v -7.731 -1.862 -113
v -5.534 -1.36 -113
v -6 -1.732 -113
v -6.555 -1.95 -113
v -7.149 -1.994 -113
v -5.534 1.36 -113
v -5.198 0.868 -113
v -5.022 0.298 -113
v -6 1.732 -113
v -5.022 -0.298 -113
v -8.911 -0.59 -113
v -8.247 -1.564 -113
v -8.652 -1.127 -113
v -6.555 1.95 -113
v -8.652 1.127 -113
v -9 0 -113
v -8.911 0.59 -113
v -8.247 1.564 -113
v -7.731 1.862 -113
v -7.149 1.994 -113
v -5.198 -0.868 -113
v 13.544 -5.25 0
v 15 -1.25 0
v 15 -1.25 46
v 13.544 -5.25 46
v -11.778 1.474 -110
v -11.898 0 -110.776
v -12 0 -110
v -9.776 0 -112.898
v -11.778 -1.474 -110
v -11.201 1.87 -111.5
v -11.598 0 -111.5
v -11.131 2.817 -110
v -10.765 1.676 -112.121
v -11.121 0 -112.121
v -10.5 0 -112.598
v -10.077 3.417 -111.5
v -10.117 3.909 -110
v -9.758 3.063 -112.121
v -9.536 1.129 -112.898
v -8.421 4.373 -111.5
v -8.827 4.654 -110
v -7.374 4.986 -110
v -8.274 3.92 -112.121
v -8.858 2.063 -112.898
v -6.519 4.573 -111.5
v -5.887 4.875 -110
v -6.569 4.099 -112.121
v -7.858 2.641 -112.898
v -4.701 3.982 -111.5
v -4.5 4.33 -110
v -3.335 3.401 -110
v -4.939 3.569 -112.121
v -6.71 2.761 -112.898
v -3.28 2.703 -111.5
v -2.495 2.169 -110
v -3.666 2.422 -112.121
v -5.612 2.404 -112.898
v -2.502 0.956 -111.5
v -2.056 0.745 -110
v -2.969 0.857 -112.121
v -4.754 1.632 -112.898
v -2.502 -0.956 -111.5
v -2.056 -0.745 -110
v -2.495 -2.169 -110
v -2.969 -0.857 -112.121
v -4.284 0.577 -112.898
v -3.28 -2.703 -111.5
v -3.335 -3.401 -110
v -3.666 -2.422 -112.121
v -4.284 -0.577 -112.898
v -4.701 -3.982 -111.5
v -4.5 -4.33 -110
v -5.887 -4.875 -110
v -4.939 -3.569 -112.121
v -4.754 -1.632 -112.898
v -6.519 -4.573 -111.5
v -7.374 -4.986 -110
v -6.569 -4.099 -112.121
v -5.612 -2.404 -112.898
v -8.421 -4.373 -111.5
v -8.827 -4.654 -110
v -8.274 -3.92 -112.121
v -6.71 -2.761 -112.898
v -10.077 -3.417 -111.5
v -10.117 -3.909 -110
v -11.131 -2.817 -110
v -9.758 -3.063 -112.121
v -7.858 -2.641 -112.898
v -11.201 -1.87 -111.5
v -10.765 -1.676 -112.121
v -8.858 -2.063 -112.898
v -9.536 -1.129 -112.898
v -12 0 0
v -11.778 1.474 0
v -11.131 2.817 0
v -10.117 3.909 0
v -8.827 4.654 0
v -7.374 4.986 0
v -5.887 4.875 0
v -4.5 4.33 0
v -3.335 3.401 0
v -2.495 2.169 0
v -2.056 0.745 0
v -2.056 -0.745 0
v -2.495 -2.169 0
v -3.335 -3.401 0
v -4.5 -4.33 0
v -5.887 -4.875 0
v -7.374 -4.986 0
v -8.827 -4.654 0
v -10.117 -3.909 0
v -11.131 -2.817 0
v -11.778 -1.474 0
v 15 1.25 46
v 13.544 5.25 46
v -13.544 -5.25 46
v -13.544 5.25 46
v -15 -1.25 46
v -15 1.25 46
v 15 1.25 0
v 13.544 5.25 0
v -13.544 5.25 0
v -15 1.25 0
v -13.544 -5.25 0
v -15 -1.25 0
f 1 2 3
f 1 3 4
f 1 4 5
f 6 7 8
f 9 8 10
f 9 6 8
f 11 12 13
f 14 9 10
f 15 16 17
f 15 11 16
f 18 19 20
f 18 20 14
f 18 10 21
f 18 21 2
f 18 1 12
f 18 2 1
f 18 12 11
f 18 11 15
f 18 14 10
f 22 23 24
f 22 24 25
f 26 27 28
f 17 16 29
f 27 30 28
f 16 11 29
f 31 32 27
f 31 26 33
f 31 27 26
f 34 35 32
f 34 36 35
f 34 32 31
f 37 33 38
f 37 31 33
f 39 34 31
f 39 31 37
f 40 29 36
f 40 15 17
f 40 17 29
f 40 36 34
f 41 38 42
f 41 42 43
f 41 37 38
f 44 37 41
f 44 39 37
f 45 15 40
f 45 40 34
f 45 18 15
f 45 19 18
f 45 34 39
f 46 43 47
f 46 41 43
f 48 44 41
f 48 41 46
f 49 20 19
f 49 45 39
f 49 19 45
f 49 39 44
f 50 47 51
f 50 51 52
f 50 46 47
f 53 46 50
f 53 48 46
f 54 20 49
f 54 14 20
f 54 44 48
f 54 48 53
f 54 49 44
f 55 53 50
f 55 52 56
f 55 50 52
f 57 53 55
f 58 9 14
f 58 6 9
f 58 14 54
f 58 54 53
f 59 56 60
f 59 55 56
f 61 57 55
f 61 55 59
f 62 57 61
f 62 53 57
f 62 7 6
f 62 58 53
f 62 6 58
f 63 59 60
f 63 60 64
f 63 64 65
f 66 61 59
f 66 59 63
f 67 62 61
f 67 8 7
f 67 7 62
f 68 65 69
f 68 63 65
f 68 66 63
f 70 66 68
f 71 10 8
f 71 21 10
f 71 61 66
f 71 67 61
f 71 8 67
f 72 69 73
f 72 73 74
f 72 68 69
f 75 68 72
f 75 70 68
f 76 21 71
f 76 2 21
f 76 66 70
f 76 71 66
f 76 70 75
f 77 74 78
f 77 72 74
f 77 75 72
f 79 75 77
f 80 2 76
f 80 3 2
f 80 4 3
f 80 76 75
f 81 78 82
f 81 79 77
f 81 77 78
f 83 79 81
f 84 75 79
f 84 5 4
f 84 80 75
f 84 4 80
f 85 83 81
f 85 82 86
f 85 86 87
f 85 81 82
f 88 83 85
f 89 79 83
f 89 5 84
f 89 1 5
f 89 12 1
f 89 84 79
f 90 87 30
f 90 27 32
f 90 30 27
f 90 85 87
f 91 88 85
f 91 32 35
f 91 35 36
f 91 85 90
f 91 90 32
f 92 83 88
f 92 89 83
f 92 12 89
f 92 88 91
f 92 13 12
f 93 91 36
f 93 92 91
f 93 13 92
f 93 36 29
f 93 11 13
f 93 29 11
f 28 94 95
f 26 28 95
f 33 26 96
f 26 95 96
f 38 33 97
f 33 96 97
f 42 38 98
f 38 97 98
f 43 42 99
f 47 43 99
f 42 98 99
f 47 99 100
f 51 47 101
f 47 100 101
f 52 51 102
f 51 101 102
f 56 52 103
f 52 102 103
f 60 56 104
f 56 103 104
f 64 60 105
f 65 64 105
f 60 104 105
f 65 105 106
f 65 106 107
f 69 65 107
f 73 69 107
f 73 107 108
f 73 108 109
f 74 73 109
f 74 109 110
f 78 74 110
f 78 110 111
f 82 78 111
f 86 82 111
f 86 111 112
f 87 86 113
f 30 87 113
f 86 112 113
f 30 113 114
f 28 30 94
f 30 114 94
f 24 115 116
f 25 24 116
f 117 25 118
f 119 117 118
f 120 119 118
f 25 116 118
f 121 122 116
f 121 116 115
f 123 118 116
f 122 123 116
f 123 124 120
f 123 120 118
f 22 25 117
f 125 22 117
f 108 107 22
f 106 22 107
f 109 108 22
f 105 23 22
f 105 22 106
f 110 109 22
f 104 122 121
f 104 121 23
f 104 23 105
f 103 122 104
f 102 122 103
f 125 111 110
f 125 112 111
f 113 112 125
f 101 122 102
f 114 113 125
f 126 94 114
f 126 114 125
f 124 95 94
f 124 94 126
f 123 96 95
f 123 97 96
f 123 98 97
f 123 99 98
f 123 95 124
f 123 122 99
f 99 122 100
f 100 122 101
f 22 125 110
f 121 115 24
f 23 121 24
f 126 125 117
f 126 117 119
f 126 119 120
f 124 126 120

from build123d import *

# Parameters (mm, degrees)
EXTRUDE_1_DEPTH = 46
SKETCH_2_R      = 5
EXTRUDE_2_DEPTH = 113
FILLET_1_R      = 3


with BuildPart() as part:
    # 草圖1 → 填料-伸長1 (new body)
    with BuildSketch(Plane.XY):
        Polygon((-15, 1.25), (-13.544119063, 5.25), (13.544119063, 5.25), (15, 1.25), (15, -1.25), (13.544119063, -5.25), (-13.544119063, -5.25), (-15, -1.25), align=None)
    extrude(amount=EXTRUDE_1_DEPTH)

    # 草圖2 → 填料-伸長2 (add)
    with BuildSketch(Plane(origin=(0, 0, 0), x_dir=(-1, 0, 0), z_dir=(0, 0, -1))):
        with Locations((7, 0)):
            Circle(SKETCH_2_R)
    extrude(amount=EXTRUDE_2_DEPTH)

    # 圓角1
    fillet_1_edges = [part.edges().sort_by_distance(p)[0] for p in [
        (-2, 0, -113),
    ]]
    fillet(fillet_1_edges, radius=FILLET_1_R)


solid = part.part
